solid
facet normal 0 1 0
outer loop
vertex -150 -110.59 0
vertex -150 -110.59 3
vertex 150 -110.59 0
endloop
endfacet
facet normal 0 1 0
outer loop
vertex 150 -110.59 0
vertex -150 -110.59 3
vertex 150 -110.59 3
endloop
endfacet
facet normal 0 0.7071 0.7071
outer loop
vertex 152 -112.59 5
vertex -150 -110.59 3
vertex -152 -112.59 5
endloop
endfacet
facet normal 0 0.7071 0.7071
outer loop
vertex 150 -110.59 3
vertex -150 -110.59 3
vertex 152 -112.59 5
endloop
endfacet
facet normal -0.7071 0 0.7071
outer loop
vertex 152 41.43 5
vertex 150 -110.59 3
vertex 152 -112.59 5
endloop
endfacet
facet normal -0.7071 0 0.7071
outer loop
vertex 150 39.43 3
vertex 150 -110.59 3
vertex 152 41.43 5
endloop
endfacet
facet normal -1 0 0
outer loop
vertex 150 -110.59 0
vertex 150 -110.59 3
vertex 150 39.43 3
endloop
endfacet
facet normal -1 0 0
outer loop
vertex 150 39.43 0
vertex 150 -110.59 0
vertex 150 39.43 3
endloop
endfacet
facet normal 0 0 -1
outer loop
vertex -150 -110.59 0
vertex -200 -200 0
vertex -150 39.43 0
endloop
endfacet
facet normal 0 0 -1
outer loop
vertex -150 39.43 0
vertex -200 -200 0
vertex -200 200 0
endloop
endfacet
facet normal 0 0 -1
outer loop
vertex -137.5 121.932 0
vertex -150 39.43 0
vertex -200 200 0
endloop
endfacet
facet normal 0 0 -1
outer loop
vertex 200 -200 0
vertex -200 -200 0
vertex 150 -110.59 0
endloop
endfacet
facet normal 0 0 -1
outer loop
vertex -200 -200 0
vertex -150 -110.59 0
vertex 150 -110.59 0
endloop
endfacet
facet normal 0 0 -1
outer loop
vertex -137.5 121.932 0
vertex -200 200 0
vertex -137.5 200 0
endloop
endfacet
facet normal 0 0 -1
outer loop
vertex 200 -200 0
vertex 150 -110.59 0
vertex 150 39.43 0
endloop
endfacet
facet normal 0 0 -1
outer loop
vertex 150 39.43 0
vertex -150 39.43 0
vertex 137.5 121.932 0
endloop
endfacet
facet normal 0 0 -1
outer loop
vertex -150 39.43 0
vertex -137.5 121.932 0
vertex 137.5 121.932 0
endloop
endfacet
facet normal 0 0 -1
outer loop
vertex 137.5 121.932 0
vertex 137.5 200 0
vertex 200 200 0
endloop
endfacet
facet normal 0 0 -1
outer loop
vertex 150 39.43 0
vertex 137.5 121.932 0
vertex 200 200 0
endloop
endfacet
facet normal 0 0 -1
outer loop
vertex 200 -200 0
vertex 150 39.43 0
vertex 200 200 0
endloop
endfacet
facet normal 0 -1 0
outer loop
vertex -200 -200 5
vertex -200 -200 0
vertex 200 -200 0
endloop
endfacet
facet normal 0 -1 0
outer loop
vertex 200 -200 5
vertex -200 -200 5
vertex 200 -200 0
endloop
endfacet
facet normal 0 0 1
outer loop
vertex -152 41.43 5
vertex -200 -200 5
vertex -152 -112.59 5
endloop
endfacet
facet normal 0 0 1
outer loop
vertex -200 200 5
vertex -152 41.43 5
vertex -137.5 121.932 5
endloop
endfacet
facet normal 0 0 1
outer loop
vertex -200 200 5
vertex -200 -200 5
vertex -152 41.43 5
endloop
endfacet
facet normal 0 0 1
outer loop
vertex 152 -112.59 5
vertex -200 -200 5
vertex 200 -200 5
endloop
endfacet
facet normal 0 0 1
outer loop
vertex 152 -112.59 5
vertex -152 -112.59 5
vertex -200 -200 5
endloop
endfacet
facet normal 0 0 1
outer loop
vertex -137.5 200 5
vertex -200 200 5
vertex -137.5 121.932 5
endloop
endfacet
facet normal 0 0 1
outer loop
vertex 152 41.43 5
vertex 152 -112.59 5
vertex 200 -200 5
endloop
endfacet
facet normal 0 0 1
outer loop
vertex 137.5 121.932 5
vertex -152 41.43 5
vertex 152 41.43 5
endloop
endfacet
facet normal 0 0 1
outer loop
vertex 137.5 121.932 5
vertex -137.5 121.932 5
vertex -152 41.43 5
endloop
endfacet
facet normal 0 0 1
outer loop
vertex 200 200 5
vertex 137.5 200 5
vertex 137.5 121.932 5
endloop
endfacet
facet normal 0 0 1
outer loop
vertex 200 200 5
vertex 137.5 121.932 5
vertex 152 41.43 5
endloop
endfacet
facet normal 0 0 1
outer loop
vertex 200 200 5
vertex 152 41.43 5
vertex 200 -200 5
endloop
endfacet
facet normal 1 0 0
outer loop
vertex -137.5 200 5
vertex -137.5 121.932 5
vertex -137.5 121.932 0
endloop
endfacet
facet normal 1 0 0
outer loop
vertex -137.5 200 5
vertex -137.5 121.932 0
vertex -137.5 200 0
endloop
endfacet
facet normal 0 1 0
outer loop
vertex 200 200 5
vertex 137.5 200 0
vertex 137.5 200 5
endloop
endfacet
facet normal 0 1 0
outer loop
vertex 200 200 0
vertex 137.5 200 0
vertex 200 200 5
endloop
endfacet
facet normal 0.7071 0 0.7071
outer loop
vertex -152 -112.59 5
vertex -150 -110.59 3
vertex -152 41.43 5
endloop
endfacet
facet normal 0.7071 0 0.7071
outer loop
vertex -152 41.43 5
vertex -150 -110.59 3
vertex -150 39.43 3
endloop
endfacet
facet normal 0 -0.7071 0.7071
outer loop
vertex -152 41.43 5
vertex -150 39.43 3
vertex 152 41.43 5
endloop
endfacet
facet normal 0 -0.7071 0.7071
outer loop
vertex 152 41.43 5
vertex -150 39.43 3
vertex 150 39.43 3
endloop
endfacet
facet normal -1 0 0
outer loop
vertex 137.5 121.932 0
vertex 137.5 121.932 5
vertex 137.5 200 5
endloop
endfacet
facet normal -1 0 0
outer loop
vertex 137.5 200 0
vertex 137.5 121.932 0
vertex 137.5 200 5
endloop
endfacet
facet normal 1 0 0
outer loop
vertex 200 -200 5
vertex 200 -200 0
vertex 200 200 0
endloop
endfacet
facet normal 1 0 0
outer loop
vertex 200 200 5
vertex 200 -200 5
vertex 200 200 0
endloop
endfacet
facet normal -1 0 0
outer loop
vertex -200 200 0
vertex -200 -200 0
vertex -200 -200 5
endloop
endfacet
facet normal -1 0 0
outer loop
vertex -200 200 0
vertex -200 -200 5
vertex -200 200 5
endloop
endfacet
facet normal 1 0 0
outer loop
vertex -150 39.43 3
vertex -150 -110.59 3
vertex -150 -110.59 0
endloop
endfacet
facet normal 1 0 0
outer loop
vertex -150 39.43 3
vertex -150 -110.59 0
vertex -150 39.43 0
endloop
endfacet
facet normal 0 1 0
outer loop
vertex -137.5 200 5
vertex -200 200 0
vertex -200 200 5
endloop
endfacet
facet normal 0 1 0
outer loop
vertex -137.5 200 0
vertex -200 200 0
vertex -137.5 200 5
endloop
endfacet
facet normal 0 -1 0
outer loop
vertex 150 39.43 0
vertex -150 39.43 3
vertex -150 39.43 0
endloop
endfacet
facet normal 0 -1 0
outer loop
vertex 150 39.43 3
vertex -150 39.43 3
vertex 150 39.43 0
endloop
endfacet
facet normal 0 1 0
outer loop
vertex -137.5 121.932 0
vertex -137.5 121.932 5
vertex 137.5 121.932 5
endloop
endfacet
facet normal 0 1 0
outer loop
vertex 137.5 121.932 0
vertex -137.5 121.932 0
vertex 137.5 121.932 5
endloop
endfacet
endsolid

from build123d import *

# Parameters (mm, degrees)
ESQUISSE1_W             = 400
ESQUISSE1_H             = 400
BOSS_EXTRU_1_DEPTH      = 5
ESQUISSE2_W             = 300
ESQUISSE2_H             = 150.02
ENL_V_MAT_EXTRU_1_DEPTH = 10
CHANFREIN1_SIZE         = 2
ESQUISSE3_W             = 275
ESQUISSE3_H             = 78.068424488
ENL_V_MAT_EXTRU_2_DEPTH = 283.886903196


with BuildPart() as part:
    # Esquisse1 → Boss.-Extru.1 (new body)
    with BuildSketch(Plane.XY):
        Rectangle(ESQUISSE1_W, ESQUISSE1_H)
    extrude(amount=BOSS_EXTRU_1_DEPTH)

    # Esquisse2 → Enlèv. mat.-Extru.1 (cut)
    with BuildSketch(Plane.XY.offset(5)):
        with Locations((0, -35.58)):
            Rectangle(ESQUISSE2_W, ESQUISSE2_H)
    extrude(amount=-ENL_V_MAT_EXTRU_1_DEPTH, mode=Mode.SUBTRACT)

    # Chanfrein1
    chanfrein1_edges = [part.edges().sort_by_distance(p)[0] for p in [
        (150, -35.58, 5),
        (0, 39.43, 5),
        (-150, -35.58, 5),
        (0, -110.59, 5),
    ]]
    chamfer(chanfrein1_edges, length=CHANFREIN1_SIZE)

    # Esquisse3 → Enlèv. mat.-Extru.2 (cut, through all)
    with BuildSketch(Plane.XY.offset(5)):
        with Locations((0, 160.965787756)):
            Rectangle(ESQUISSE3_W, ESQUISSE3_H)
    extrude(amount=-ENL_V_MAT_EXTRU_2_DEPTH, mode=Mode.SUBTRACT)


solid = part.part
